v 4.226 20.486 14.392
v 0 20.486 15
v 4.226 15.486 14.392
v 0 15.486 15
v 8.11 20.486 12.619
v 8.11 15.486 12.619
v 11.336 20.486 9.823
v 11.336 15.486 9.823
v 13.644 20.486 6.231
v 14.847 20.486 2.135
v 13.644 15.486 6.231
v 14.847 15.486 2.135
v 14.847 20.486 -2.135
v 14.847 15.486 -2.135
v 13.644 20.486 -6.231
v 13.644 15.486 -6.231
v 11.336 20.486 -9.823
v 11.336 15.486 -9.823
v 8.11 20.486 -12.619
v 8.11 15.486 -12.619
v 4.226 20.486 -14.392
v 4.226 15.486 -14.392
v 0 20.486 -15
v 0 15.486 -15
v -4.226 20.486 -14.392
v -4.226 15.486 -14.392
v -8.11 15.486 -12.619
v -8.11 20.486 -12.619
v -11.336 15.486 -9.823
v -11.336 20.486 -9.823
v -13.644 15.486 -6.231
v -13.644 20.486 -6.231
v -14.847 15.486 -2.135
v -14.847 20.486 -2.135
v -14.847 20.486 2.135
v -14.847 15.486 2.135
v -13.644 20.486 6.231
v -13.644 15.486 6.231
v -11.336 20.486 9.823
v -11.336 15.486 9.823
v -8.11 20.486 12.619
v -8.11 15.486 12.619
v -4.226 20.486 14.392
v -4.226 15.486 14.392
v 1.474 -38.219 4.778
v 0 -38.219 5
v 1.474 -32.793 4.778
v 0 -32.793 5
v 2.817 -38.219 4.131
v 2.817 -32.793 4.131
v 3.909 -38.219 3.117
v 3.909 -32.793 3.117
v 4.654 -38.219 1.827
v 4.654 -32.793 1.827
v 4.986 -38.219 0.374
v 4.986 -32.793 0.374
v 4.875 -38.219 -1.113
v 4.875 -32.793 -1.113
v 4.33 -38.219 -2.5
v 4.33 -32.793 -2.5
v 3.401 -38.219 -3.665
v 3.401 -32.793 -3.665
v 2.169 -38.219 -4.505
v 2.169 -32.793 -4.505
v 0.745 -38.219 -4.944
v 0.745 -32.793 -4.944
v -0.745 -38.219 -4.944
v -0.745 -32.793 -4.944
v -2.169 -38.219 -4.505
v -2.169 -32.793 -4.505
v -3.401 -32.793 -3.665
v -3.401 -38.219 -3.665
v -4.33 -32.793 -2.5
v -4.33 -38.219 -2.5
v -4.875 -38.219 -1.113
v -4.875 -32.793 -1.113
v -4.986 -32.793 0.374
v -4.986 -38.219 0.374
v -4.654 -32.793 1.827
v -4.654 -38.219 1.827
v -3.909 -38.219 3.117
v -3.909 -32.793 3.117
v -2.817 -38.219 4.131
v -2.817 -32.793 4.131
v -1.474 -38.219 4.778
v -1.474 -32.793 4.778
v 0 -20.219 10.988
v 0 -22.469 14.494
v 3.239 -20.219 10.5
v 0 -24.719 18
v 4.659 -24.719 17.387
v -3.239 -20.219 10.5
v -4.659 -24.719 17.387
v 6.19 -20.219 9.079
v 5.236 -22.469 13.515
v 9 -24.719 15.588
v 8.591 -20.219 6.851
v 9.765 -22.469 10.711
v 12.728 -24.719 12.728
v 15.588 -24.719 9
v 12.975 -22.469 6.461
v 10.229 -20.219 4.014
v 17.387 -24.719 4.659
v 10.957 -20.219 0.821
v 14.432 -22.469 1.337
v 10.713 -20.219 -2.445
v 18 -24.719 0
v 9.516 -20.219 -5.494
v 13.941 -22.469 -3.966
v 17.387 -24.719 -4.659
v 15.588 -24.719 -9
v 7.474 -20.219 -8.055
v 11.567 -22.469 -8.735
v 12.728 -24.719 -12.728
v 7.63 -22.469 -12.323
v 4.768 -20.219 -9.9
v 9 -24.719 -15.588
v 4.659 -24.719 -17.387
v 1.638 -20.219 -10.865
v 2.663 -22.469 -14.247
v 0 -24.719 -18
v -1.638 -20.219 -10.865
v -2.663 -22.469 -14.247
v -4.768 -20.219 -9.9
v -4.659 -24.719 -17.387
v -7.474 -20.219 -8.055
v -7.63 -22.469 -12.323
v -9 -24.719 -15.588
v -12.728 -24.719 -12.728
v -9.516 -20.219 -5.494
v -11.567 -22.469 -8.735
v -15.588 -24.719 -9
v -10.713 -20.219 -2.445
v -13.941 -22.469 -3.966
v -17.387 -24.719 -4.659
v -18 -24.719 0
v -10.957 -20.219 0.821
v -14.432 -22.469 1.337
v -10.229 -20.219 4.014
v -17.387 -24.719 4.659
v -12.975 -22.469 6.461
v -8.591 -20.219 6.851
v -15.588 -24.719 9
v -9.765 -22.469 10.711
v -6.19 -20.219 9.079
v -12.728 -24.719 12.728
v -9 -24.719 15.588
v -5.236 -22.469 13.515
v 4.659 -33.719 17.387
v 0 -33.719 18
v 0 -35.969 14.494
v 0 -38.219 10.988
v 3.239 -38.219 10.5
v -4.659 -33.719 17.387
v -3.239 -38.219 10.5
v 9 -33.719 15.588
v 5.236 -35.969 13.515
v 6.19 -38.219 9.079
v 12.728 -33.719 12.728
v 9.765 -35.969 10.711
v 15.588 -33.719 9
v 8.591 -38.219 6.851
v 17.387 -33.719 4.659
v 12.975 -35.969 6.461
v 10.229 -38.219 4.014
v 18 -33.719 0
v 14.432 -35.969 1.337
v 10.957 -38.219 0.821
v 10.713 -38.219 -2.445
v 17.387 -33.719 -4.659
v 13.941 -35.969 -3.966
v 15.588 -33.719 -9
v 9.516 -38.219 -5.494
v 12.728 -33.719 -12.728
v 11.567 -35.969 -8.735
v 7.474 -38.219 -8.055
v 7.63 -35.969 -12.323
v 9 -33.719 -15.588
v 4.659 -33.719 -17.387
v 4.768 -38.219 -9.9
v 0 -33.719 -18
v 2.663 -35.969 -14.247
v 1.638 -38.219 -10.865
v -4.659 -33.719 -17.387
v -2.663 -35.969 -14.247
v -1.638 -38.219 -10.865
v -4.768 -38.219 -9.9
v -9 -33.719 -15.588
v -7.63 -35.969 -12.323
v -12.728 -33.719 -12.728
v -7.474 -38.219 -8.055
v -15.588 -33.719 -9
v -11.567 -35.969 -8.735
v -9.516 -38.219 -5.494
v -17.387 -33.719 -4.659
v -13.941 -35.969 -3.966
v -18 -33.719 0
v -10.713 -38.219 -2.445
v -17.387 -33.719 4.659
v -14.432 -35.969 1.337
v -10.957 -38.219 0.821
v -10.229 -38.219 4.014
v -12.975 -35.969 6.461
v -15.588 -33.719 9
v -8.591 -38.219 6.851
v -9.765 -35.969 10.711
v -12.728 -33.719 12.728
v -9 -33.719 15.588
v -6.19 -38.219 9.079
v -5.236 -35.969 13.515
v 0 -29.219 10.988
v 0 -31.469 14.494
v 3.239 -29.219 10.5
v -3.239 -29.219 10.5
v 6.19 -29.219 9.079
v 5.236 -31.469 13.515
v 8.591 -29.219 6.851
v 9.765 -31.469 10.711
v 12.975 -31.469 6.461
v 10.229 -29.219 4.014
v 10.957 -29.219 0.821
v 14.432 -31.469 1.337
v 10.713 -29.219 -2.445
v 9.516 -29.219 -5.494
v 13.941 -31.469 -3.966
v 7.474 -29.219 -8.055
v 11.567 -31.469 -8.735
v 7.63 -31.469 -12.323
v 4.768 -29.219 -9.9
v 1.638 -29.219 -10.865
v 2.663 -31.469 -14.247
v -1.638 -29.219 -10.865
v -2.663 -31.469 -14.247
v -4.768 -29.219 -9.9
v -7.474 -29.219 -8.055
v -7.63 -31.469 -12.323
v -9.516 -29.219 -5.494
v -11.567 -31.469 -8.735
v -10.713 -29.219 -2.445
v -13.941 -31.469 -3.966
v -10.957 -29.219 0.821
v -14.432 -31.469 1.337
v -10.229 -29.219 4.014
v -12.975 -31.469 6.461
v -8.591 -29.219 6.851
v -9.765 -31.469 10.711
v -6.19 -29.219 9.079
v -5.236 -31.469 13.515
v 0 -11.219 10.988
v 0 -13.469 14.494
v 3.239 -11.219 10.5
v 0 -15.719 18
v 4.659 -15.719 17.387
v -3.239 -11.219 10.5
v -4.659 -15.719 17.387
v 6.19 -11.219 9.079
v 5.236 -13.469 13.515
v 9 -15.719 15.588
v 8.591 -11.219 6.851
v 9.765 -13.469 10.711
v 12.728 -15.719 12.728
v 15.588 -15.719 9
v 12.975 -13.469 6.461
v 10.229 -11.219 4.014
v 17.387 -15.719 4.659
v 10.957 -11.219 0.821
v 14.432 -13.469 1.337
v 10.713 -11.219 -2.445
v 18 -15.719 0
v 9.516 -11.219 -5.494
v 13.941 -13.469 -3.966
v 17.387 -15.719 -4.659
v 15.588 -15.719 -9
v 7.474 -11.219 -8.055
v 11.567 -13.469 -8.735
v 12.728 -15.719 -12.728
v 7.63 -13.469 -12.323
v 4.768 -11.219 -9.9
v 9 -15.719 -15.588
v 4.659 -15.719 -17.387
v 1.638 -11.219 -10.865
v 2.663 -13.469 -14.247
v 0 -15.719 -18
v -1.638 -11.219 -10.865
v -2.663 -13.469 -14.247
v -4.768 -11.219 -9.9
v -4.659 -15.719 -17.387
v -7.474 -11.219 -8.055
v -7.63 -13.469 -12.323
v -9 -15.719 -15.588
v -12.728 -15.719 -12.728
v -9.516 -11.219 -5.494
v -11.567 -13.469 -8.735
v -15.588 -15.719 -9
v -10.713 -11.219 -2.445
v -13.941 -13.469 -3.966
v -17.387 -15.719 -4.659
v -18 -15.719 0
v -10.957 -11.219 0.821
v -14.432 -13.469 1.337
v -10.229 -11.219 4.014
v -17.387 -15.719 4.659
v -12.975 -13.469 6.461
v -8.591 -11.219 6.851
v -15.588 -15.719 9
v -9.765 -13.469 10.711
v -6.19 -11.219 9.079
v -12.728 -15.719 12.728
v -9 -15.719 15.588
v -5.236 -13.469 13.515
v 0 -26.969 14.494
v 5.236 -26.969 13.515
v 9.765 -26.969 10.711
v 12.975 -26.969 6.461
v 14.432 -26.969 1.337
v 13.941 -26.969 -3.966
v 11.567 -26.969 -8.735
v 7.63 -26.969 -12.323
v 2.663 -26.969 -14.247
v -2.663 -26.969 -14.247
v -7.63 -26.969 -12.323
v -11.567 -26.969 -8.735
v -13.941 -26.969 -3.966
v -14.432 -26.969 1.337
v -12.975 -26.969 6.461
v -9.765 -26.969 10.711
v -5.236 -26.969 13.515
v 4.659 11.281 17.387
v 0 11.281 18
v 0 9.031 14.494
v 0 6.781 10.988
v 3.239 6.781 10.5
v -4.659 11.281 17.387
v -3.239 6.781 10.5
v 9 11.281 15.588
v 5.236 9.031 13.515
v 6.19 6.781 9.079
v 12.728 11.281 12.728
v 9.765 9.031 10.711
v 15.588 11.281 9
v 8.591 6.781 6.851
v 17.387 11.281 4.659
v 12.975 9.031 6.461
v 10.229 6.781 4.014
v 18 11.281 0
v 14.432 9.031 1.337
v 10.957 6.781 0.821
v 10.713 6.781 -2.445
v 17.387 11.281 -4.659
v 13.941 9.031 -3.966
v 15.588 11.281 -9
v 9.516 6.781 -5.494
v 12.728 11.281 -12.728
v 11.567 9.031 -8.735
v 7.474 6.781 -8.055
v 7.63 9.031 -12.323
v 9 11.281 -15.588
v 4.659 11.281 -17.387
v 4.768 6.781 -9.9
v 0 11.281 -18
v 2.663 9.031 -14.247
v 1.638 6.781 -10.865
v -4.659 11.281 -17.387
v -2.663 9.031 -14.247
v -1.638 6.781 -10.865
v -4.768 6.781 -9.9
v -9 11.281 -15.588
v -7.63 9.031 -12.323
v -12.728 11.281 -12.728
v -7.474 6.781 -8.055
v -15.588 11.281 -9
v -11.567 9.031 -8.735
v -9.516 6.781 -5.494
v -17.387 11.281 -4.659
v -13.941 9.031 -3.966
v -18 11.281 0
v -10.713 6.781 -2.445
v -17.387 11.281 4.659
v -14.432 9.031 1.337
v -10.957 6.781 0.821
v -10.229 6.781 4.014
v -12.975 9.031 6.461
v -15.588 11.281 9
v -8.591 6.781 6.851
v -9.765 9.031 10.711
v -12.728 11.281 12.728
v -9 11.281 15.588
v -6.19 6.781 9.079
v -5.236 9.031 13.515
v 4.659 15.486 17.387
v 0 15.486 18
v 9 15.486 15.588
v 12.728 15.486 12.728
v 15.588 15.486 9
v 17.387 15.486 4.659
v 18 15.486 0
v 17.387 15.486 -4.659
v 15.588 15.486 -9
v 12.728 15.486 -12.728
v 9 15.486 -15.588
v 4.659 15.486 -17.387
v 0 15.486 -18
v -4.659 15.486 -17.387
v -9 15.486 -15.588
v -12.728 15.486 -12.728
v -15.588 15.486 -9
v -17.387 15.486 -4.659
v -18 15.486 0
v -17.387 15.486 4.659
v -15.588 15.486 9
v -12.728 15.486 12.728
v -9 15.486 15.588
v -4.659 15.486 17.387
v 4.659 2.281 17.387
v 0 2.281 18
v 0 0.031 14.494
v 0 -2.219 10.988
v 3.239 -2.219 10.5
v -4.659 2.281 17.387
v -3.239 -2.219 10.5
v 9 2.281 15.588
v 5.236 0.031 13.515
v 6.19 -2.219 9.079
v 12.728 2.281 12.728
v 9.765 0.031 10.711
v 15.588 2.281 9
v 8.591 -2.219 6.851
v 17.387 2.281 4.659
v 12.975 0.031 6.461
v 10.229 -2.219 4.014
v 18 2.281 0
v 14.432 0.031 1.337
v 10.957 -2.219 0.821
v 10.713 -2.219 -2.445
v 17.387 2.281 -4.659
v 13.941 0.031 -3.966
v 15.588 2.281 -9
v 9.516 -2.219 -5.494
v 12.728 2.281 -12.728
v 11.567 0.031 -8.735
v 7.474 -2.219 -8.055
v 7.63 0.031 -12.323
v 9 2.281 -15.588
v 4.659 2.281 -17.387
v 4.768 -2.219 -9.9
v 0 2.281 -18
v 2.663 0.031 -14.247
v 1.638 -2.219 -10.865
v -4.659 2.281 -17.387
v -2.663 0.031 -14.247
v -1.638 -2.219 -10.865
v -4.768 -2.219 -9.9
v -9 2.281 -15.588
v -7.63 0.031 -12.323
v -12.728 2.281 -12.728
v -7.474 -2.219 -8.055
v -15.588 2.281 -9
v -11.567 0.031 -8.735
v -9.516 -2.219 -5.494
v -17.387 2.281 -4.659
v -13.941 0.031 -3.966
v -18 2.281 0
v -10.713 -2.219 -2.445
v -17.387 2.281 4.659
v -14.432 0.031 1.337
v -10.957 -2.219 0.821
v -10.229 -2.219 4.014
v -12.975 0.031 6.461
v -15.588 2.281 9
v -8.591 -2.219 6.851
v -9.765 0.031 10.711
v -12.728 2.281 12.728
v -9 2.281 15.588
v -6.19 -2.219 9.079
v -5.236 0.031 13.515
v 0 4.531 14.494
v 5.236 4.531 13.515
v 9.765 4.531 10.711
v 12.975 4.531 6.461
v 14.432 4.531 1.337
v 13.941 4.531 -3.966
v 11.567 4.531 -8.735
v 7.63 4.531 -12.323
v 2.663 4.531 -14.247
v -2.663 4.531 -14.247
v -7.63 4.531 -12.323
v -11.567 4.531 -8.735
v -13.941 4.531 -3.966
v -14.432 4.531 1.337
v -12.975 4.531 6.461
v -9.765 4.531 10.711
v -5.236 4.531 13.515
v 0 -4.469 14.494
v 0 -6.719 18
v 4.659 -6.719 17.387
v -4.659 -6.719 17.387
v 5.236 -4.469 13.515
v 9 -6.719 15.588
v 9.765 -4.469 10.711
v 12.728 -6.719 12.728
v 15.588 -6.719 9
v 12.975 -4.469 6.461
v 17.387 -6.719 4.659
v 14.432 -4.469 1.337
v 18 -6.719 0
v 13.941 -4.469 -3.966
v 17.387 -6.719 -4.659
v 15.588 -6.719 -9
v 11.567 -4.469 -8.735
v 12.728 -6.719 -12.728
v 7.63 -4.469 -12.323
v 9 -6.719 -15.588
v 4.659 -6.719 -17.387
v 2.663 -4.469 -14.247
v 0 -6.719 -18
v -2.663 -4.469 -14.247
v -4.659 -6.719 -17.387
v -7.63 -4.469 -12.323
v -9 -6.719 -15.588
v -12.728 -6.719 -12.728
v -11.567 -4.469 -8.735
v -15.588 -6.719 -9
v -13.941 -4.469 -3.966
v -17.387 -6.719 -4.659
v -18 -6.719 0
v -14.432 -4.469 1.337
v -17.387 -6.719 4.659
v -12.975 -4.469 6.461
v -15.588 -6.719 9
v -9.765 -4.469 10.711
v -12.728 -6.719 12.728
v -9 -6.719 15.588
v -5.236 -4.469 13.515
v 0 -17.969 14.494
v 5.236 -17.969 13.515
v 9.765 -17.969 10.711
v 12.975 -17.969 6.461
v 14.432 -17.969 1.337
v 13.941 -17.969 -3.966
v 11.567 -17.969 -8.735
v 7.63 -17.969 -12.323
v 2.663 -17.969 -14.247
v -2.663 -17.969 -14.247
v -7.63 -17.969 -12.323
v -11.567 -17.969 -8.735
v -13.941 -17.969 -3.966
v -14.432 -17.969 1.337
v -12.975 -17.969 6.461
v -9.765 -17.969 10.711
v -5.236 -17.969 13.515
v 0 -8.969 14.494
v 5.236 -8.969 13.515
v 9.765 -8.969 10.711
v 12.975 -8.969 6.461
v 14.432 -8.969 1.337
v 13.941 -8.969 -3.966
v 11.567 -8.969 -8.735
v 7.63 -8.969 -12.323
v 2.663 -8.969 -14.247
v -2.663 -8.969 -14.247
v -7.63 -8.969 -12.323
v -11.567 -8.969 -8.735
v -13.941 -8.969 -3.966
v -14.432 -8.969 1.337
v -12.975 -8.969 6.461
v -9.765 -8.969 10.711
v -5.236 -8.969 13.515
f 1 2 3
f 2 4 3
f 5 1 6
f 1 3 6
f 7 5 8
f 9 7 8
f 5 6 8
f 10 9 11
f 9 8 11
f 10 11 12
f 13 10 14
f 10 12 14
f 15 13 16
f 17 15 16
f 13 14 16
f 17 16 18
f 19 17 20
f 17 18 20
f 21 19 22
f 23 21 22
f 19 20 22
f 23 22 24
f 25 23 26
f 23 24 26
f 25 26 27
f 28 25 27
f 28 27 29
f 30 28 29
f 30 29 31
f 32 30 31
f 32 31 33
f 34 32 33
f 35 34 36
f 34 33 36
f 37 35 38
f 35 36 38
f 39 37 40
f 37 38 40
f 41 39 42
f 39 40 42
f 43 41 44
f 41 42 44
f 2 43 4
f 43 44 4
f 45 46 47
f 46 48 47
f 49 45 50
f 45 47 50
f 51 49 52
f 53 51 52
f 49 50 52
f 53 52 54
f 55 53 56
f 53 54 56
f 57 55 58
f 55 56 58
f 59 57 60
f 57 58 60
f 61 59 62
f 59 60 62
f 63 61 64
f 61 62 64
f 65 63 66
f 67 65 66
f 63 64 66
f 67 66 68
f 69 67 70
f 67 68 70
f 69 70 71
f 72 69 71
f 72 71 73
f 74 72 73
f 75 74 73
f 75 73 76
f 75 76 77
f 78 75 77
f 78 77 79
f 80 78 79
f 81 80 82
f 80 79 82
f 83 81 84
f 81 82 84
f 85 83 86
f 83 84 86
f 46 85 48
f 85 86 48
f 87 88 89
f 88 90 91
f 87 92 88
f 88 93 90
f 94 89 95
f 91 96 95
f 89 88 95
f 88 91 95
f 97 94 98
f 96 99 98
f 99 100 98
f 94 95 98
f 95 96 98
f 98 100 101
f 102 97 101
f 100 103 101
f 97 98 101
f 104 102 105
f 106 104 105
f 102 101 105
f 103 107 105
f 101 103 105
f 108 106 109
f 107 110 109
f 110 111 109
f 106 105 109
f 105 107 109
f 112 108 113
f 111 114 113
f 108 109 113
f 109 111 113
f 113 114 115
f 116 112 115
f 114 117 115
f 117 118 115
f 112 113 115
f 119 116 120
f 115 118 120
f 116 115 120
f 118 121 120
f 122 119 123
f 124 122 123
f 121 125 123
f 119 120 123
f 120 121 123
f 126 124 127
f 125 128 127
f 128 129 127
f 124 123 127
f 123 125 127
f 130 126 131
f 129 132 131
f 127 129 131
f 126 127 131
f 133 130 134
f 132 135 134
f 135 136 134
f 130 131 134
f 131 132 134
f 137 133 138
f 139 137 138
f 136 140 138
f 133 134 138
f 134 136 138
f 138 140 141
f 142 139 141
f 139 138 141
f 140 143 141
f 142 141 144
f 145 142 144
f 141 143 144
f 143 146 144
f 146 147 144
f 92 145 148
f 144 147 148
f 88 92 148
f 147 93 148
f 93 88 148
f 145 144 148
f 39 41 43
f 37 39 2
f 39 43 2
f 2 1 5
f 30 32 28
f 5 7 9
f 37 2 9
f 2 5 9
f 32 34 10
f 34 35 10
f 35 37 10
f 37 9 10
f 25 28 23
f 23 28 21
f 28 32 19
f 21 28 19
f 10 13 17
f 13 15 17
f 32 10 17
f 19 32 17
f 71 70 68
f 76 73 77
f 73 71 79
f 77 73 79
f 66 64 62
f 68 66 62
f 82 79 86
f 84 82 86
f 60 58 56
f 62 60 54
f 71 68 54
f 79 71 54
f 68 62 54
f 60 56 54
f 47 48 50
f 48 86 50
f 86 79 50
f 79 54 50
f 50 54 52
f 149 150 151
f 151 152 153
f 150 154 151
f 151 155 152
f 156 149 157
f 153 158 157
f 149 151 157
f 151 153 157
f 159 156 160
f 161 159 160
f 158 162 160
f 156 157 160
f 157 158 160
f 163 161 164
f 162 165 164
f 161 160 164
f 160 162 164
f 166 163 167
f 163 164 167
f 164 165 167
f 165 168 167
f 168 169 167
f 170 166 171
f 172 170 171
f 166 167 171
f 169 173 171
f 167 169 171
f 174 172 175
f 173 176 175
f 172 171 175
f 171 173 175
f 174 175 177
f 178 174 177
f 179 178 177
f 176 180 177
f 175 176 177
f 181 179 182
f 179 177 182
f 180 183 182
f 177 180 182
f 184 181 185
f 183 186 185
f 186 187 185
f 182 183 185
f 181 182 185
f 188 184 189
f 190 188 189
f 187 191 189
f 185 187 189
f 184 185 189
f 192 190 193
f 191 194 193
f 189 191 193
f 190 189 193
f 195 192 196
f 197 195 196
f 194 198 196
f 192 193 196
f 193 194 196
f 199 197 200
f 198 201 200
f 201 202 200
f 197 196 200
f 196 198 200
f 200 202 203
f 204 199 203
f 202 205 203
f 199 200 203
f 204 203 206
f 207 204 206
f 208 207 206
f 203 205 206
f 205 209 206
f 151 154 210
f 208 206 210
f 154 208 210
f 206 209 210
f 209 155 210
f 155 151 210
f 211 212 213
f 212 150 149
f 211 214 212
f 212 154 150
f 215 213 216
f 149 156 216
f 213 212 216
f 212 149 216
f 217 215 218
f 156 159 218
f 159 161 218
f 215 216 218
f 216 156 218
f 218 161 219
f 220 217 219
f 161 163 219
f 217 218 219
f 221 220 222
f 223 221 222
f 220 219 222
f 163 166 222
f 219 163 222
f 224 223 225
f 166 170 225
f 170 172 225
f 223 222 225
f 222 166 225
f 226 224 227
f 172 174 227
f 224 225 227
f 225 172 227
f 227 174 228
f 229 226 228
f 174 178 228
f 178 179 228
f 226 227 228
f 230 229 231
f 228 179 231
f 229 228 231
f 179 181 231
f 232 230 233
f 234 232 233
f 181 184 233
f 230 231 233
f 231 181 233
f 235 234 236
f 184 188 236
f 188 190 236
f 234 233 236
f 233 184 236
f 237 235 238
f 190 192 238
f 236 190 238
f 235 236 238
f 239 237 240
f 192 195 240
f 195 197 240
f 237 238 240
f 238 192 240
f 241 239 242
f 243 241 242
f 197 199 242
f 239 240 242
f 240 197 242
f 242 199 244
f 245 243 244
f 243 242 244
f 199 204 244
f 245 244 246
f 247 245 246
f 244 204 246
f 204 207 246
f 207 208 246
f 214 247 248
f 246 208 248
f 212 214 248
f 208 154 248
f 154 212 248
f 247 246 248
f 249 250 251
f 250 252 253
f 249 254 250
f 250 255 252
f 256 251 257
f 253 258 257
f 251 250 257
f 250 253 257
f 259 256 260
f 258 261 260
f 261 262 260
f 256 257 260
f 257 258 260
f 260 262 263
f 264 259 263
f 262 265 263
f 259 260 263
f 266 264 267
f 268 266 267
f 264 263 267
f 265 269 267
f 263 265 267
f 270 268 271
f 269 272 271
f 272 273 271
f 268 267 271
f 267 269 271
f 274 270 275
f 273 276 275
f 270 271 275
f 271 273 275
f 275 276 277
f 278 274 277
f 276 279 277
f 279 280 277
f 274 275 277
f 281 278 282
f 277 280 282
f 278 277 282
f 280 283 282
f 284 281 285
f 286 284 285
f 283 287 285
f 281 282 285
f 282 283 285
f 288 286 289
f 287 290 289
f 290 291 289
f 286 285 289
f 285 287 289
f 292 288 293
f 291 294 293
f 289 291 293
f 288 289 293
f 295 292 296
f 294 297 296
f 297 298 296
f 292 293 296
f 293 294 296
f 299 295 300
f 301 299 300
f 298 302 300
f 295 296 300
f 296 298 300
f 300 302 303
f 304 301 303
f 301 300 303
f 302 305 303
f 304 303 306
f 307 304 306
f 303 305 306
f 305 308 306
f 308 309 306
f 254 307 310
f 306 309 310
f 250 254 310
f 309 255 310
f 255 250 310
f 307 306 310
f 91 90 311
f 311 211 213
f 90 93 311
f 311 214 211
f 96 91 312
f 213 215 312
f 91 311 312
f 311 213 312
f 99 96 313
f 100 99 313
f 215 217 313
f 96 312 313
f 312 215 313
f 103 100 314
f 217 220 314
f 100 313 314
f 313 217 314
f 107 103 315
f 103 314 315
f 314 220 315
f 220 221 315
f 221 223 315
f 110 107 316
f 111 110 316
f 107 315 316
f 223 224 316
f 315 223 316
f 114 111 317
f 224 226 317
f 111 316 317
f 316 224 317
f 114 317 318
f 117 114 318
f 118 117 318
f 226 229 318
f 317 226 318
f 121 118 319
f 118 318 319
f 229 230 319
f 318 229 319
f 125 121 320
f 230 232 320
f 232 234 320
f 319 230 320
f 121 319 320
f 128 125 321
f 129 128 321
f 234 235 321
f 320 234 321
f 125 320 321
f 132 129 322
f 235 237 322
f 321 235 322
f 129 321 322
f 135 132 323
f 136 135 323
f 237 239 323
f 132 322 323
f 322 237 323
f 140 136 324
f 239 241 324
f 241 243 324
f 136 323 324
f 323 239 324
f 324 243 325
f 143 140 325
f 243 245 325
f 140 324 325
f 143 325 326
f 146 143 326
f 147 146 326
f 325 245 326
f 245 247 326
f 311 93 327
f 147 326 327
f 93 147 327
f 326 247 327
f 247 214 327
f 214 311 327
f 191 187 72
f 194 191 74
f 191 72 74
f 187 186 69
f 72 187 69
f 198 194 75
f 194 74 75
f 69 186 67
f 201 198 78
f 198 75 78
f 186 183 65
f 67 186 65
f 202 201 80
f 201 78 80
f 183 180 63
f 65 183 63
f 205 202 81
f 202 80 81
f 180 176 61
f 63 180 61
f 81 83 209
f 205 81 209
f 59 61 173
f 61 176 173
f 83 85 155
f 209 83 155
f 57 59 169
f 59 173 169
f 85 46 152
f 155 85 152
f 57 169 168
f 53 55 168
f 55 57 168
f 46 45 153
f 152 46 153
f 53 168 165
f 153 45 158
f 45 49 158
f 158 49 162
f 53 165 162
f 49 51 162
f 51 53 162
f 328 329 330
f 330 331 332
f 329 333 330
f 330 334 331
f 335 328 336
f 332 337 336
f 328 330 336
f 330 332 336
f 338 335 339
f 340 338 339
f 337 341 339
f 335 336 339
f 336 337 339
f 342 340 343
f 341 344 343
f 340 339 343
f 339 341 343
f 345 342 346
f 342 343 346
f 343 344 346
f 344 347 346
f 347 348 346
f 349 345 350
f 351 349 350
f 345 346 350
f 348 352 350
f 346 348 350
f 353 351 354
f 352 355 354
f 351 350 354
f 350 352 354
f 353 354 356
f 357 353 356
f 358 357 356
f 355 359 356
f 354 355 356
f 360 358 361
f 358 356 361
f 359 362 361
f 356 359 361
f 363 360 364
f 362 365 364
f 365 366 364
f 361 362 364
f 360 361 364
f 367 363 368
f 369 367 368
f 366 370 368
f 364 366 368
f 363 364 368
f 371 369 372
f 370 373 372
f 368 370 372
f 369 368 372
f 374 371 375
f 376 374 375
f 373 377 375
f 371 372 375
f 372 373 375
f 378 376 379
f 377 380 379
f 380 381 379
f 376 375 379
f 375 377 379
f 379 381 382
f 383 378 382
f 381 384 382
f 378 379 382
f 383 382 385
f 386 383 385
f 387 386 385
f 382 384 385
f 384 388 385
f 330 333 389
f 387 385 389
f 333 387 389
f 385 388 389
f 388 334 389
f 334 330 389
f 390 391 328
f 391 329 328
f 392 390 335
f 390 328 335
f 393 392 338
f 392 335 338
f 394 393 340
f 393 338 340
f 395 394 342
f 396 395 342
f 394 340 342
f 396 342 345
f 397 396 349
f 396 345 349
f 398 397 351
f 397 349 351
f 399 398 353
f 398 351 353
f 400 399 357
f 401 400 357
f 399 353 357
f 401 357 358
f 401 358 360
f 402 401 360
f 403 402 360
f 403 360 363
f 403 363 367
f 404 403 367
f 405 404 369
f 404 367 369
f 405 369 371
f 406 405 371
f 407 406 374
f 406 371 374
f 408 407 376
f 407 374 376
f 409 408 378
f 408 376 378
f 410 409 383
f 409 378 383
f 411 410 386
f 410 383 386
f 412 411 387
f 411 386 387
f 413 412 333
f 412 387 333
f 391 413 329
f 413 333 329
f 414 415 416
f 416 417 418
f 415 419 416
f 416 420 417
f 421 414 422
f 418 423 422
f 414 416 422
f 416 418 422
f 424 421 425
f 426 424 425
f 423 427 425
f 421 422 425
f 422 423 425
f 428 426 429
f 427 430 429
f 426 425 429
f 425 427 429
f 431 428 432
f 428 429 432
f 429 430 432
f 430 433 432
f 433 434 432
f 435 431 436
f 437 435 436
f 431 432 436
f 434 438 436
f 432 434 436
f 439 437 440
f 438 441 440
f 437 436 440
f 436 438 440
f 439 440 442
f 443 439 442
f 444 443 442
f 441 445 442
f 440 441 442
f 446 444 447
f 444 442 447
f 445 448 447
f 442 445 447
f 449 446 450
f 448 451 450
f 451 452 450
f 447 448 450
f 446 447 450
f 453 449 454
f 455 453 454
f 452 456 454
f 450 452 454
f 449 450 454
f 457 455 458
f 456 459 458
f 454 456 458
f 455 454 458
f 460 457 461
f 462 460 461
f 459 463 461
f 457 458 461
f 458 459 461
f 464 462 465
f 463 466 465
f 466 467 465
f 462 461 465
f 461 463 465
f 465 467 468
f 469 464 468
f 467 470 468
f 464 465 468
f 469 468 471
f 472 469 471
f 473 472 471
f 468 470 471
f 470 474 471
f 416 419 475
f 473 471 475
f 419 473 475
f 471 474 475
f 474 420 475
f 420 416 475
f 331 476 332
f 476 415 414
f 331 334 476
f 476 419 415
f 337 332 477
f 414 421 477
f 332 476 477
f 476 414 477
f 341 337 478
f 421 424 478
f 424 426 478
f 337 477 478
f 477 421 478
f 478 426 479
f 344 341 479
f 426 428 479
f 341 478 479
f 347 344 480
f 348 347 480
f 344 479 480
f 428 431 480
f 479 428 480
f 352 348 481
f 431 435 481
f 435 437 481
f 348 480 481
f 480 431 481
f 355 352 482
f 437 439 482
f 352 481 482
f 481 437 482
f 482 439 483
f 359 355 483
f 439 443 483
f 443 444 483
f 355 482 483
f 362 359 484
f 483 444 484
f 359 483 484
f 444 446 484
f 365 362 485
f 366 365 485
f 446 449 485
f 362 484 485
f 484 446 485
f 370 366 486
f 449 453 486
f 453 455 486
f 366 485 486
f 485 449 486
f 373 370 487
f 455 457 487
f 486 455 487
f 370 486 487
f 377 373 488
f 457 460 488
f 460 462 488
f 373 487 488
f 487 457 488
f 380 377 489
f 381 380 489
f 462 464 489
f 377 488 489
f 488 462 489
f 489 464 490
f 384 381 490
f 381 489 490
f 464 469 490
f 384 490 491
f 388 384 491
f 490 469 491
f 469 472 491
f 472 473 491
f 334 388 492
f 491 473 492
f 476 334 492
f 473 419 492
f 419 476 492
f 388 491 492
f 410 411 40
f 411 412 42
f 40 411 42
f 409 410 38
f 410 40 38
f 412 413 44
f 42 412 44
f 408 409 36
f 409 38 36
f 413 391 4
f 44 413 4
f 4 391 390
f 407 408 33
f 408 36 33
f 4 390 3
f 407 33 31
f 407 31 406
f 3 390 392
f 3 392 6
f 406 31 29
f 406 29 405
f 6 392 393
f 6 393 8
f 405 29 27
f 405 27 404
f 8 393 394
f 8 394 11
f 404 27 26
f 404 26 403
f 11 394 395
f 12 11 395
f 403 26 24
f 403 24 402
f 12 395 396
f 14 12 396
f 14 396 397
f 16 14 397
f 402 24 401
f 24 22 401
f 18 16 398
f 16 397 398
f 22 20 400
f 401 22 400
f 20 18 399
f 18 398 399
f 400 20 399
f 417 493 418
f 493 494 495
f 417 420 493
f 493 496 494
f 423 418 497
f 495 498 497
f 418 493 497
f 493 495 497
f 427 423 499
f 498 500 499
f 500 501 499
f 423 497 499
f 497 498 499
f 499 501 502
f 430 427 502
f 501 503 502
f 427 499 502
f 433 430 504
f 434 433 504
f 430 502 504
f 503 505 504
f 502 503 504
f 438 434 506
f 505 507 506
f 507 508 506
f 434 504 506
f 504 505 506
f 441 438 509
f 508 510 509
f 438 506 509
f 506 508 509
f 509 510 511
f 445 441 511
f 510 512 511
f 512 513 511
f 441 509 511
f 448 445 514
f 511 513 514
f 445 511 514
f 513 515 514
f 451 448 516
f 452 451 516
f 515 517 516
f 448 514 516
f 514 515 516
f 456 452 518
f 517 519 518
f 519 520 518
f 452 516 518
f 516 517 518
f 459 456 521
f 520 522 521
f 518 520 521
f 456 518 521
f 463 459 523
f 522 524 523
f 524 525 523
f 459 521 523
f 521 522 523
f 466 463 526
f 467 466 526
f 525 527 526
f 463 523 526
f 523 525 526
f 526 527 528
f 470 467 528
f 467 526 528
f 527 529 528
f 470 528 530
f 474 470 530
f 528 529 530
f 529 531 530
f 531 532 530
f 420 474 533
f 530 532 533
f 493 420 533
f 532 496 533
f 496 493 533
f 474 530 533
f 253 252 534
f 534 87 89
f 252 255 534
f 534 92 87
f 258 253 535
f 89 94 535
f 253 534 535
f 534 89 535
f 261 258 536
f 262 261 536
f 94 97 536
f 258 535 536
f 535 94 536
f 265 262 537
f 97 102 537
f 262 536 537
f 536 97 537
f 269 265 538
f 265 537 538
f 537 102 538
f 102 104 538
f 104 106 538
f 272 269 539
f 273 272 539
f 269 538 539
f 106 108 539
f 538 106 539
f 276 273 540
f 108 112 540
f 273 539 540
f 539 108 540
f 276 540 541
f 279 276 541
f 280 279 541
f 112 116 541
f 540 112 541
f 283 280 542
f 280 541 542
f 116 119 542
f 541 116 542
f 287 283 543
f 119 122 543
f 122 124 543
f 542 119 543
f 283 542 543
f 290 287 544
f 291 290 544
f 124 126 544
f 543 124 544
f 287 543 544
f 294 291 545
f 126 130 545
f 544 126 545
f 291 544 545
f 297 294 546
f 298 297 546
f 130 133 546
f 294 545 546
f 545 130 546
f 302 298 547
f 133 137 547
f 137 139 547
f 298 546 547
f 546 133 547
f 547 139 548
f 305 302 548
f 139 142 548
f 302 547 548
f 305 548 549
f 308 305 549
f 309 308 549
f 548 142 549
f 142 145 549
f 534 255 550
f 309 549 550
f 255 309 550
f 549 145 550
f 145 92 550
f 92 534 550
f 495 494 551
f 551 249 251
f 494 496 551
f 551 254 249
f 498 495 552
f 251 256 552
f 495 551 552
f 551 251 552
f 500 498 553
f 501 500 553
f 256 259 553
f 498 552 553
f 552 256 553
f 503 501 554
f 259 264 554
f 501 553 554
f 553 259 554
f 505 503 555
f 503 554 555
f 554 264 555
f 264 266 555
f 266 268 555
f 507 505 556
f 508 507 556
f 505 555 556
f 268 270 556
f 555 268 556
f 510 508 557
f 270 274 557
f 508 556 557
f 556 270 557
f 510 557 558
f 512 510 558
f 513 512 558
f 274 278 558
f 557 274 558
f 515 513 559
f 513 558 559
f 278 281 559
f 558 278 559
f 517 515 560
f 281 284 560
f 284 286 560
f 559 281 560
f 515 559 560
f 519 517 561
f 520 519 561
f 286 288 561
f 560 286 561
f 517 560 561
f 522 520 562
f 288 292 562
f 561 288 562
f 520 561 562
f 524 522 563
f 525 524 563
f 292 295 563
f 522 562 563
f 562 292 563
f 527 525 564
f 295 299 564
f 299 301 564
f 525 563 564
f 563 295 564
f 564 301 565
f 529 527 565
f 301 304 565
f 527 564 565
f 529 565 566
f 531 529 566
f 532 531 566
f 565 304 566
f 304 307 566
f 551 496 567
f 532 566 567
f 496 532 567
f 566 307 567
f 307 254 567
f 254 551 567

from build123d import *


with BuildPart() as f1:
    # F0 (on Right) → F1 (revolve)
    with BuildSketch(Plane.YZ):
        Polygon((-32.793459, 0), (20.486485, 0), (20.486485, 15), (15.486485, 15), (15.486485, 18), (11.280604, 18), (6.780604, 10.988123), (2.280604, 18), (-2.219396, 10.988123), (-6.719396, 18), (-11.219396, 10.988123), (-15.719396, 18), (-20.219396, 10.988123), (-24.719396, 18), (-29.219396, 10.988123), (-33.719396, 18), (-38.219396, 10.988123), (-38.219396, 5), (-32.793459, 5), align=None)
    revolve(axis=Axis((0, -6.153487, 0), (0, 1, 0)))


solid = f1.part
